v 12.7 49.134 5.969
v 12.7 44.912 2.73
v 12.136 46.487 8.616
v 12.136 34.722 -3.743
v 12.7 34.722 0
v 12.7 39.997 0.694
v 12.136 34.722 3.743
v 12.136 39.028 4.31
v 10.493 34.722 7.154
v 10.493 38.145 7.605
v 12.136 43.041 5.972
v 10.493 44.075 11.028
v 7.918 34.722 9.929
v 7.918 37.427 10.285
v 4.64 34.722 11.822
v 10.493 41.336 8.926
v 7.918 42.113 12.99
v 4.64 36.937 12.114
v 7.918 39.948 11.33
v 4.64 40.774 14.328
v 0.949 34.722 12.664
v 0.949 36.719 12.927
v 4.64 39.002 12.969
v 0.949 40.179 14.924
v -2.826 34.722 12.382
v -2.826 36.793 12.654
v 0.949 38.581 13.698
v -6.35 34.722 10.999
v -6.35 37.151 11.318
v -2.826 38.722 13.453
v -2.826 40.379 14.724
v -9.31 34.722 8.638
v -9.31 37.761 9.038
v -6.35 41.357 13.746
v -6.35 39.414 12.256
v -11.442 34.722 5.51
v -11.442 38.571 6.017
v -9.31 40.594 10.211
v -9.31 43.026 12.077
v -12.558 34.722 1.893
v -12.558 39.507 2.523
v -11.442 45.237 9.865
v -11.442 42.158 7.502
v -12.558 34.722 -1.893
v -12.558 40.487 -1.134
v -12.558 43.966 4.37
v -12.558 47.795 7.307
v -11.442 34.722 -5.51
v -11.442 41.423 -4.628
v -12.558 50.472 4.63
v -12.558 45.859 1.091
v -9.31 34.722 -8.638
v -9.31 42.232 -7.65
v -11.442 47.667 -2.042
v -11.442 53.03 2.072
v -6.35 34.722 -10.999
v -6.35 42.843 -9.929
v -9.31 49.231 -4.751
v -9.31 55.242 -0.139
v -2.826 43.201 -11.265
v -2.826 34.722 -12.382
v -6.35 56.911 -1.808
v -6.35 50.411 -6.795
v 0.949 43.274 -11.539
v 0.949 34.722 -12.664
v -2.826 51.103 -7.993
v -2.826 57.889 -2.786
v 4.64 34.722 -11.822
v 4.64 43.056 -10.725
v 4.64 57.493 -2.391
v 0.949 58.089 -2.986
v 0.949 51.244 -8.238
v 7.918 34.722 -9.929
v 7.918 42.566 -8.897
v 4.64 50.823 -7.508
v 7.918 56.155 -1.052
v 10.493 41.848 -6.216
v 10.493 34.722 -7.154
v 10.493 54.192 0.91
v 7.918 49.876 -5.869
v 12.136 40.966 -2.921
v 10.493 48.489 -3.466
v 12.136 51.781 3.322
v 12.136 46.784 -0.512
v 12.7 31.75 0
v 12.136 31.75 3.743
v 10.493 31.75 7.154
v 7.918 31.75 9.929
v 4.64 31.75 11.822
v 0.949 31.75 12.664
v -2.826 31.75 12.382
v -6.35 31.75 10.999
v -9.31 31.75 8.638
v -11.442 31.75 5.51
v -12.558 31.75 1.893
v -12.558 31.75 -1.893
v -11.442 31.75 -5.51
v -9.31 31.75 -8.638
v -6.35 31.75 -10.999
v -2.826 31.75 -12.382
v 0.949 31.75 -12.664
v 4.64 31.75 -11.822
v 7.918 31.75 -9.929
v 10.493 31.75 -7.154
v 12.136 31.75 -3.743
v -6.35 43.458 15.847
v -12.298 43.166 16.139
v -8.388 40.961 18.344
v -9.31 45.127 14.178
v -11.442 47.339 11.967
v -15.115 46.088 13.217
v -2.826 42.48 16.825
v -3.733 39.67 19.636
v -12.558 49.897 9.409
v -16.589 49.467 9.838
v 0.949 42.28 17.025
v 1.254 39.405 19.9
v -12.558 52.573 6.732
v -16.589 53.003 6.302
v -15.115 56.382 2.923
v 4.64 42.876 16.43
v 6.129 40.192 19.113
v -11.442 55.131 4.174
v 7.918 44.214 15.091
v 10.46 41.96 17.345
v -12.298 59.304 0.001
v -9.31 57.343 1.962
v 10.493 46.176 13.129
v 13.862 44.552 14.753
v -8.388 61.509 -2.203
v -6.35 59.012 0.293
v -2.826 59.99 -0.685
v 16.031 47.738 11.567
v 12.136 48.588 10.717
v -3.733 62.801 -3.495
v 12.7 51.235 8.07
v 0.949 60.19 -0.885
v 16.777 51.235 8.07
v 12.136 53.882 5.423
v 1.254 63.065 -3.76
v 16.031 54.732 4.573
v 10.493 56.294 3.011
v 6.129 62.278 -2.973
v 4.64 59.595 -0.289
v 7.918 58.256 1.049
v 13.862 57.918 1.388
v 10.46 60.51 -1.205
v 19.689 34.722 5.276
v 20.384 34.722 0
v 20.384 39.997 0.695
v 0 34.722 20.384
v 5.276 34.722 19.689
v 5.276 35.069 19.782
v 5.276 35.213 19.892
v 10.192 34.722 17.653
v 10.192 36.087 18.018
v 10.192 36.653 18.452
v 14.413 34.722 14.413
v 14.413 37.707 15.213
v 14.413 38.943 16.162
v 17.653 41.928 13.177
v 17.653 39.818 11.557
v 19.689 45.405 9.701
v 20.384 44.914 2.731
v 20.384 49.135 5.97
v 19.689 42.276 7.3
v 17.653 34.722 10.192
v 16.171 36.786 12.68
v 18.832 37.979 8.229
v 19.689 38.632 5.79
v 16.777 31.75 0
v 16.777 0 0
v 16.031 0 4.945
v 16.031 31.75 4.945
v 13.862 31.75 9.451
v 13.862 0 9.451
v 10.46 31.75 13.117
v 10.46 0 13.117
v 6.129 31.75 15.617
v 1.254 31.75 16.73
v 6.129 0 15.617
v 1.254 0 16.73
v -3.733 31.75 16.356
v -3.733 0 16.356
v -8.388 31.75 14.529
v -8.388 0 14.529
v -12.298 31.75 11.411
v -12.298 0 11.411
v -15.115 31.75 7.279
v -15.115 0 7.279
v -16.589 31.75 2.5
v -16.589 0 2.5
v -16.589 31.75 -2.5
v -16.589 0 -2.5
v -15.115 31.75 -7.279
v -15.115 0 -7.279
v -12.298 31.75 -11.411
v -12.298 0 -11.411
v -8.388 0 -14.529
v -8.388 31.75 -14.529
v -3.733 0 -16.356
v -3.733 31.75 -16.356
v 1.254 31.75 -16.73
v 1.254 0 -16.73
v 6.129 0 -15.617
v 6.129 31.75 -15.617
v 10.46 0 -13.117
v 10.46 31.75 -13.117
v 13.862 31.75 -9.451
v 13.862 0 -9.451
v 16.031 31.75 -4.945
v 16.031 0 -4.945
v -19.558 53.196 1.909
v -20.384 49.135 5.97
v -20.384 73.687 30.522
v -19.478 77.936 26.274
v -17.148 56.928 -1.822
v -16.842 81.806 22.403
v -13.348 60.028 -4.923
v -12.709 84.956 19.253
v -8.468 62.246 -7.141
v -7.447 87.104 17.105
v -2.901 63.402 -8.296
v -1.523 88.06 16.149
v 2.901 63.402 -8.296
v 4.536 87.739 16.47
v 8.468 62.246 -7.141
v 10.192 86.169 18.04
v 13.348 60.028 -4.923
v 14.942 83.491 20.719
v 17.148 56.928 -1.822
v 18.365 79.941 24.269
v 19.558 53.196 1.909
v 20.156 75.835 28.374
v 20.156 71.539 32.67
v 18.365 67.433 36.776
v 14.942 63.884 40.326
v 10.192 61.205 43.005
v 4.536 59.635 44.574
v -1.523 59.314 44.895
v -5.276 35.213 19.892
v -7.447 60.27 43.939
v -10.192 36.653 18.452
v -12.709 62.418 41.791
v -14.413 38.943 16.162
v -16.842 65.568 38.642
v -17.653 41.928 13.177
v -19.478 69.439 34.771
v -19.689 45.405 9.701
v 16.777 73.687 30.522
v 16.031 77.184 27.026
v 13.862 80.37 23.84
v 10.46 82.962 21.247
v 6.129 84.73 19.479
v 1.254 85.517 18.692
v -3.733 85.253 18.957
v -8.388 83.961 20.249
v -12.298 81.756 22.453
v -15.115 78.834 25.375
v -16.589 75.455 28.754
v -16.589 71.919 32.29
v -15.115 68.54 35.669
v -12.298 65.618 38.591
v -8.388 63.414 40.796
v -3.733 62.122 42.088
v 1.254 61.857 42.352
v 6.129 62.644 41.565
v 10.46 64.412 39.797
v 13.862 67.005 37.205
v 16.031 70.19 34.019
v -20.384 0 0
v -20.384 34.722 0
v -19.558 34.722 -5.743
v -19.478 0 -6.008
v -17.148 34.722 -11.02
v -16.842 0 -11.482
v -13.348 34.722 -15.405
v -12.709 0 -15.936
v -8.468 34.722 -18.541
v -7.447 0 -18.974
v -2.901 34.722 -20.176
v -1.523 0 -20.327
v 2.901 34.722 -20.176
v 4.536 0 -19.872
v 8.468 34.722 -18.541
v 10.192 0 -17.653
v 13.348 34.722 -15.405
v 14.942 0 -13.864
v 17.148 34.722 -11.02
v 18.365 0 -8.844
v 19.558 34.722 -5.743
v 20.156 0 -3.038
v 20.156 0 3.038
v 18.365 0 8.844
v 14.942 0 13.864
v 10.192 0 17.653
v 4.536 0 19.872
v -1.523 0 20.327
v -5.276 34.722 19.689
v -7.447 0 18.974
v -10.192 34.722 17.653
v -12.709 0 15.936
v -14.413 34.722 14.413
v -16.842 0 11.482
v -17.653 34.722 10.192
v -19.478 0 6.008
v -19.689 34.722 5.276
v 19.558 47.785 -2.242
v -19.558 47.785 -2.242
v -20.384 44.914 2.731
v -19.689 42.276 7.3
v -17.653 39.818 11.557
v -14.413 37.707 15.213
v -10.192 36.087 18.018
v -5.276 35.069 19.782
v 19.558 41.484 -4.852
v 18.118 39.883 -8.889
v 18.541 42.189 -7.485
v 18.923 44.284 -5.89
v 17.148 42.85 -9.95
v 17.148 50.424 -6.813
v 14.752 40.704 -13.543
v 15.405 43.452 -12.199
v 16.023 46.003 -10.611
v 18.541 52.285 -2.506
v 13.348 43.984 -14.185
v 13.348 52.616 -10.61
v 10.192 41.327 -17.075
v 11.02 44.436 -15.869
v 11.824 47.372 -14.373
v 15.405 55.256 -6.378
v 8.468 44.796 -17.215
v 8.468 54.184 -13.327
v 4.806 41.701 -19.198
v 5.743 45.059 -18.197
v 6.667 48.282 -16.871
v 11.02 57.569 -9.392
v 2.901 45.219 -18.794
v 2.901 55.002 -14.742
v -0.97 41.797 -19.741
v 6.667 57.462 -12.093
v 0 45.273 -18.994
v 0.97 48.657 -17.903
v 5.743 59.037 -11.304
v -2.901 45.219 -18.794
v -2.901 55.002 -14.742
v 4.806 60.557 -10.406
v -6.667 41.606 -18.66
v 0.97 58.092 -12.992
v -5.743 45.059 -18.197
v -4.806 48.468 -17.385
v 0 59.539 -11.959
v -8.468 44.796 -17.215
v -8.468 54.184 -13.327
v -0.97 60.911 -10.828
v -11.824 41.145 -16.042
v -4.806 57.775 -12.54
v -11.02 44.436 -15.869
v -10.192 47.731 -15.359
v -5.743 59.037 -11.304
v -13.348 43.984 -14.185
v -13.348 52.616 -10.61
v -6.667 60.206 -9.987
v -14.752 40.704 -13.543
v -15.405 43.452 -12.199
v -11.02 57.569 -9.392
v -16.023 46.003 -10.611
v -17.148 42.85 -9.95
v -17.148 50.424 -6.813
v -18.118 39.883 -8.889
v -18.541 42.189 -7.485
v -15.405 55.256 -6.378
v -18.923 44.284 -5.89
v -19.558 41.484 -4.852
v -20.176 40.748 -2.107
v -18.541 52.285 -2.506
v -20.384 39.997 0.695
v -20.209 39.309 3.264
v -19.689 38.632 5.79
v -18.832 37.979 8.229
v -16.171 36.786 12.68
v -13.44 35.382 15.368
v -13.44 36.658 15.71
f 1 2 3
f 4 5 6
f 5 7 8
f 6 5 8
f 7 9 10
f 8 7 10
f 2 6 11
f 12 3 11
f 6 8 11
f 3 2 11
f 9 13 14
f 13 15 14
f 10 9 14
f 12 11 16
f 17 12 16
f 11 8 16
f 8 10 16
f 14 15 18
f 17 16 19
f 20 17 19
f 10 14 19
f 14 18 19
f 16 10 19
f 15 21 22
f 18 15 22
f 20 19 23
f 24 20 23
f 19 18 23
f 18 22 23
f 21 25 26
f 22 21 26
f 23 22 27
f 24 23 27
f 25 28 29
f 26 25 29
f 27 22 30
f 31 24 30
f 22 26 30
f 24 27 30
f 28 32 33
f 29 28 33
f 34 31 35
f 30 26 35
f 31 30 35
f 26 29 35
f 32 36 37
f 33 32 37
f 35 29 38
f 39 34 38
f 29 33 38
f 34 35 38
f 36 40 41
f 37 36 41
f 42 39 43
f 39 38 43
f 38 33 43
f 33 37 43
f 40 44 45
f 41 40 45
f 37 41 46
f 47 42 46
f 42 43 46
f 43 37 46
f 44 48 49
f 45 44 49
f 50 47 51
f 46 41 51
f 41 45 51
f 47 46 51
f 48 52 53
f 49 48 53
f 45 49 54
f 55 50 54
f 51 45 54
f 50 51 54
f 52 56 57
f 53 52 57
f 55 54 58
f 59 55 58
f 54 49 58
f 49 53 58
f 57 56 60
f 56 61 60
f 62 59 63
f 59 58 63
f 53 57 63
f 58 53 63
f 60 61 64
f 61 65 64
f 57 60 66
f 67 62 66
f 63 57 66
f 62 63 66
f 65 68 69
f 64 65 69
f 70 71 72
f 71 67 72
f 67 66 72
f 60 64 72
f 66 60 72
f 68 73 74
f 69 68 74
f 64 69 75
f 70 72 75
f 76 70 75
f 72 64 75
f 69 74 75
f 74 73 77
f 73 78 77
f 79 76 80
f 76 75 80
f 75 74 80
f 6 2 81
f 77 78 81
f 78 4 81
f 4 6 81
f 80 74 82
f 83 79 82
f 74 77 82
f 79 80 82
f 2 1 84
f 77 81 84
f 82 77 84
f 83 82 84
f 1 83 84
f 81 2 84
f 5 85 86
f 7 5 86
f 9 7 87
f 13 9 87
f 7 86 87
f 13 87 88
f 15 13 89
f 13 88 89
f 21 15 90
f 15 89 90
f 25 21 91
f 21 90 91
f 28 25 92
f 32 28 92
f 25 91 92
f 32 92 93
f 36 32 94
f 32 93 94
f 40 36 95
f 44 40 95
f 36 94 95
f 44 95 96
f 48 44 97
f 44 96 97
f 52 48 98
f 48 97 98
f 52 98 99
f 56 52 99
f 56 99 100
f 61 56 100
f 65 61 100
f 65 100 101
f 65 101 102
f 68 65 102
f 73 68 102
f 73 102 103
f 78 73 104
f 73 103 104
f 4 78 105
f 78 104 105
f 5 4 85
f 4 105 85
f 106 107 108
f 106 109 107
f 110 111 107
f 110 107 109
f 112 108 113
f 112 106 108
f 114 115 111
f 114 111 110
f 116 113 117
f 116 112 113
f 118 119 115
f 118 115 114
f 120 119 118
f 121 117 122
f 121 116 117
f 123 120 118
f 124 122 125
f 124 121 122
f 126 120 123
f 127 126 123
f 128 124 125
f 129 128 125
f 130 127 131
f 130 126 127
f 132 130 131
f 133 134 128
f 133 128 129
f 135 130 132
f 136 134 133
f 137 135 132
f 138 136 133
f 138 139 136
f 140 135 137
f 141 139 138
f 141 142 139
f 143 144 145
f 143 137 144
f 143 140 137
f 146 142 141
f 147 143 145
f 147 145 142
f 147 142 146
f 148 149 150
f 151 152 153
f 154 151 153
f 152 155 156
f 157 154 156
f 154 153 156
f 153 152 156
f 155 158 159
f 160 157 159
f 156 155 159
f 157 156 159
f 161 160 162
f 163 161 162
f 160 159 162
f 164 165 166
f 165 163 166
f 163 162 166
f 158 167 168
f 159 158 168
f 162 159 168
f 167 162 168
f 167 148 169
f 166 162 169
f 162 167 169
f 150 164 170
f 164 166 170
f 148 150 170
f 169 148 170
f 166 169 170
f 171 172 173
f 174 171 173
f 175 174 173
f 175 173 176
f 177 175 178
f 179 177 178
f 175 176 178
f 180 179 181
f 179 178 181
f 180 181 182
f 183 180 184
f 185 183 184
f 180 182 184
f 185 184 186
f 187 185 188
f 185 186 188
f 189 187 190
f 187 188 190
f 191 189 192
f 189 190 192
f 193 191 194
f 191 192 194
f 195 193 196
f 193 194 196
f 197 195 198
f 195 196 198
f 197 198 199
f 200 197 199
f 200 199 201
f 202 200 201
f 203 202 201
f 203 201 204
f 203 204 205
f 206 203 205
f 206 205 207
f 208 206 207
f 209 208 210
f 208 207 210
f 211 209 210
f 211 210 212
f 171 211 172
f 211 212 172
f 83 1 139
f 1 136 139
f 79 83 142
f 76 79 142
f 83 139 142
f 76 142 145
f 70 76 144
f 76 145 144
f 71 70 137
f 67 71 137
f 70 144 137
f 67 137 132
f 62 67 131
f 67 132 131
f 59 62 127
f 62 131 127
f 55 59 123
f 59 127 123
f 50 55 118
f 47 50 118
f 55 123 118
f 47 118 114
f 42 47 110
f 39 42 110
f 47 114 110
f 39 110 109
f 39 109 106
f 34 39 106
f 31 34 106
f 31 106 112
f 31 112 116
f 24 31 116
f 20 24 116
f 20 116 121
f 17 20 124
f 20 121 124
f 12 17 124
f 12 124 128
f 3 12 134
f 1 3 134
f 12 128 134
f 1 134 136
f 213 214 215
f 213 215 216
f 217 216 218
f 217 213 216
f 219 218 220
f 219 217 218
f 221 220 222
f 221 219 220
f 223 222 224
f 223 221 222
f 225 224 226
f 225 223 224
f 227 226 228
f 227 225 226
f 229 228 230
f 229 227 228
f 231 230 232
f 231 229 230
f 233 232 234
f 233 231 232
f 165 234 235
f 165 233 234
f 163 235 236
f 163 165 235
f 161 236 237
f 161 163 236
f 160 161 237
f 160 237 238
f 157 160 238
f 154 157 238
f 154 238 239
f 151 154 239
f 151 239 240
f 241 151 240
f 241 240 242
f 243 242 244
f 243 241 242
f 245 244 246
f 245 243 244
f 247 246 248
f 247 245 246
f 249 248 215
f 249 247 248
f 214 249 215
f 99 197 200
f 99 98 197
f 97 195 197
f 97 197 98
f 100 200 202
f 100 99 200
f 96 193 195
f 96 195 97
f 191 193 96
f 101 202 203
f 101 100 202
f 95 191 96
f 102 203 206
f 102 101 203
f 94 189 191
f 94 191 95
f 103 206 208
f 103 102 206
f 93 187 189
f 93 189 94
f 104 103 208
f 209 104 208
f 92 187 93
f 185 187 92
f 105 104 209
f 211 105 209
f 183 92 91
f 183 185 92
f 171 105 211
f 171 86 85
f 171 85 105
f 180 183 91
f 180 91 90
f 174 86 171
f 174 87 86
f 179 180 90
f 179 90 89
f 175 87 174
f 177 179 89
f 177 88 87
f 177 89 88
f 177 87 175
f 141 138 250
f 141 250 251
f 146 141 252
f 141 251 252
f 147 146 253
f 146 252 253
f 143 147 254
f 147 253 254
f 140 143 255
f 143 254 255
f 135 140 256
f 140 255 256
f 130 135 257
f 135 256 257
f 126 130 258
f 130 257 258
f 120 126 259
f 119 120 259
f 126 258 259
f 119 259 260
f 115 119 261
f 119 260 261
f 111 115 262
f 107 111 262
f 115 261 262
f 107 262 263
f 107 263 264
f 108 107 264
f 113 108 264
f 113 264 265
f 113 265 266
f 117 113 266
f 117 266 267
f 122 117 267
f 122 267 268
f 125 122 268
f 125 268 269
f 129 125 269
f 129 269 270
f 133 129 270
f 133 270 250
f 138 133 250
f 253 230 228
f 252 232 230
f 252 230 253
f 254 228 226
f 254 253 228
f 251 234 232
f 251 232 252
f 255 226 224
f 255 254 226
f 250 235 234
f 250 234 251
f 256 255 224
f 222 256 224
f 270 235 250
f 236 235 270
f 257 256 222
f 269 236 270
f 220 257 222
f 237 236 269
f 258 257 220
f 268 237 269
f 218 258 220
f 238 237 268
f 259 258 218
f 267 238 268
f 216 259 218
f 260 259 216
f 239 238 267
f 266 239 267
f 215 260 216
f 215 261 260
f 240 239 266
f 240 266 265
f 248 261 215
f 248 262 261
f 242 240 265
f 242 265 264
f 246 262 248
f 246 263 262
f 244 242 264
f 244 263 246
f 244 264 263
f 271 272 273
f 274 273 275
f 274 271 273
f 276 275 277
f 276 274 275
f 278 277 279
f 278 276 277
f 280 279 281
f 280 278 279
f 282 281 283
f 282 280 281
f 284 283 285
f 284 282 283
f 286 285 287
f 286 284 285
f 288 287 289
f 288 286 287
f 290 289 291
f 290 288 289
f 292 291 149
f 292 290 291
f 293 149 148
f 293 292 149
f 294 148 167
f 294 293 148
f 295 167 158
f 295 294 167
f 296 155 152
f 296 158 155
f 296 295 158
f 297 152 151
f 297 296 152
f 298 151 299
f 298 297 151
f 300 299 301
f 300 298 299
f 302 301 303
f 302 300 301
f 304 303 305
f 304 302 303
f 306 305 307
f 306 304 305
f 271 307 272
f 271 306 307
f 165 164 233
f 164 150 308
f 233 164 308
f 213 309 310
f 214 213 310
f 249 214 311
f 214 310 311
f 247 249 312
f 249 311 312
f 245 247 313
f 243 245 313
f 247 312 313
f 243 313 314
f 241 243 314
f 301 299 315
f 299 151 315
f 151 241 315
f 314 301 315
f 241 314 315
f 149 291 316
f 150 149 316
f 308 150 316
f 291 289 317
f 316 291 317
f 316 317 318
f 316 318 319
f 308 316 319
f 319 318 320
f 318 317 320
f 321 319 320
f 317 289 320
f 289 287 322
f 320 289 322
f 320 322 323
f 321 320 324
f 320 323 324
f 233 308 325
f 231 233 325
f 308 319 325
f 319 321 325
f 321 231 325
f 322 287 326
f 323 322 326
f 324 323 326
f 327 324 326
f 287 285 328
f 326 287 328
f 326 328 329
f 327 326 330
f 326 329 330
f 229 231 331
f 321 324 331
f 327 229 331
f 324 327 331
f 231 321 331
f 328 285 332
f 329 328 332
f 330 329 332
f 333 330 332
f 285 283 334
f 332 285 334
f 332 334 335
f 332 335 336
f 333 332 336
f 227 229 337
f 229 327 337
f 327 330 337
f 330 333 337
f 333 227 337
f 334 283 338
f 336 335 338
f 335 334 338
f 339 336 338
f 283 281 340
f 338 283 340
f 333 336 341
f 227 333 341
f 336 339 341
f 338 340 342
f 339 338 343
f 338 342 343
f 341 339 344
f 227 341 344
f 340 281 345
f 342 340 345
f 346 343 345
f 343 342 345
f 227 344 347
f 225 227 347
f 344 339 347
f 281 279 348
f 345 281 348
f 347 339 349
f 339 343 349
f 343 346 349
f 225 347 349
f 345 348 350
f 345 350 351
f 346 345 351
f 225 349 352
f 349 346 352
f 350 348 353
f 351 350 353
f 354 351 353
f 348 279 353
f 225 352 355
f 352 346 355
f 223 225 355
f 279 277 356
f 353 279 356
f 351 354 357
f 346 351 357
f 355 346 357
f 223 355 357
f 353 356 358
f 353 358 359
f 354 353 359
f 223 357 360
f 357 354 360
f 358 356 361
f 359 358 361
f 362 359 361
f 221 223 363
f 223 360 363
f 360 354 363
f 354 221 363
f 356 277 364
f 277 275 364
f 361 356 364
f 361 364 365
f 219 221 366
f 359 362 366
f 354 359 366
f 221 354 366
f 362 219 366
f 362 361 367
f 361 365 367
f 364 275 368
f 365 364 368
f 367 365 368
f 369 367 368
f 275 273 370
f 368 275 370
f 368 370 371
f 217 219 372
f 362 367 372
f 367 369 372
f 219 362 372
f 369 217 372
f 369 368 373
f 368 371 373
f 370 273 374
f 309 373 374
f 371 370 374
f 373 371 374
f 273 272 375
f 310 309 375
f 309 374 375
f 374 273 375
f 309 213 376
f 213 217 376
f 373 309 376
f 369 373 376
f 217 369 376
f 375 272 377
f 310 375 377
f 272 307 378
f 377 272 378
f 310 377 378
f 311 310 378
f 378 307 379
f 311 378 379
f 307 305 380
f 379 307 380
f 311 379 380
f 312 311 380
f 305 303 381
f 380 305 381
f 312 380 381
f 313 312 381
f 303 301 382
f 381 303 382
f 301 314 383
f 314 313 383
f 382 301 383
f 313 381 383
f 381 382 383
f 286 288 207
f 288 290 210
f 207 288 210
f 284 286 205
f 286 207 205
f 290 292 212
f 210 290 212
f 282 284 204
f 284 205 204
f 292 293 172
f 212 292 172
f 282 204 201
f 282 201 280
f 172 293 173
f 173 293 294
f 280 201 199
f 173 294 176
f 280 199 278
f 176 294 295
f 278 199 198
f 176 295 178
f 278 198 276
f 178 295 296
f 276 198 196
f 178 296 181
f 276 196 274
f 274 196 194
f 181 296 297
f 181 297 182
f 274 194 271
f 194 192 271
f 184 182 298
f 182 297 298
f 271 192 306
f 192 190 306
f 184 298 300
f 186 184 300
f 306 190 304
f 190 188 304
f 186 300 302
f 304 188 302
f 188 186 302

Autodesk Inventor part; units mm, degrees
sketch "Sketch1" plane through (0, 0, 0) normal (0, 1, 0) x (-1, 0, 0)
  circle A0 centre (0, 0) radius 20.3835
  dimension "d0" = 40.767
extrude "Extrusion1" add sketch "Sketch1" along normal blind 34.7218
sketch "Sketch2" plane through (0, 34.7218, 0) normal (0, 1, 0) x (1, 0, 0)
  circle A0 centre (0, 0) radius 20.3835 projected
  line L0 (0, -20.3835) -> (-27.7458, -20.3835)
ref_plane "Work Plane1" through (0, 34.7218, 20.3835) normal (0, 0.7071068, 0.7071068) x (-1, 0, 0)
sketch "Sketch3" plane through (0, 34.7218, 20.3835) normal (0, 0.7071068, 0.7071068) x (-1, 0, 0)
  circle A0 centre (0, -20.3835) radius 20.3835 projected
  circle A1 centre (0, -20.3835) radius 20.3835
  point P0 (0, 10.1387)
extrude "Extrusion2" add sketch "Sketch3" along normal blind 34.7218
sketch "Sketch4" plane through (0, 0, 0) normal (0, -1, 0) x (1, 0, 0)
  circle A0 centre (0, 0) radius 16.7767
  dimension "d6" = 33.5534
extrude "Extrusion3" cut sketch "Sketch4" against normal blind 31.75
sketch "Sketch5" plane through (0, 73.6871, 30.5222) normal (0, 0.7071068, 0.7071068) x (1, 0, 0)
  circle A0 centre (0, 0) radius 16.7767
  point P0 (0, -30.5222)
  dimension "d9" = 33.5534
extrude "Extrusion4" cut sketch "Sketch5" against normal blind 31.75
ref_plane "Work Plane2" through (0, 51.2365, 8.0716) normal (0, 0.7071068, 0.7071068) x (1, 0, 0)
ref_plane "Work Plane3" through (0, 31.75, 0) normal (0, -1, 0) x (1, 0, 0)
revolve "Revolution1" add sketch "Sketch2" angle 45 about axis through (0, 34.7218, 20.3835) along (1, 0, 0)
ref_plane "Work Plane4" through (0, 34.7218, 20.3835) normal (-1, 0, 0) x (0, -1, 0)
sketch "Sketch6" plane through (0, 34.7218, 20.3835) normal (-1, 0, 0) x (0, -1, 0)
  line L0 (0, 33.7996) -> (-51.2396, 33.7996)
  point P0 (34.7218, -20.3835)
ref_plane "Work Plane5" through (0, 34.7218, 54.1831) normal (-0.7071068, 0, -0.7071068) x (0, 1, 0)
sketch "Sketch8" plane through (0, 34.7218, 20.3835) normal (-1, 0, 0) x (0, -1, 0)
  line L0 (-28.3776, -24.1748) -> (-4.6518, -0.449) projected
  line L1 (2.9718, -3.6068) -> (2.9718, -37.1602) projected
  line L2 (-4.6518, -0.449) -> (2.9718, -3.6068)
  point P0 (34.7218, -20.3835)
sketch "Sketch9" plane through (0, 31.75, 0) normal (0, -1, 0) x (1, 0, 0)
  circle A0 centre (0, 0) radius 12.7
  dimension "d17" = 25.4
extrude "Extrusion5" cut sketch "Sketch9" against normal blind 2.9718
sketch "Sketch10" plane through (0, 51.2365, 8.0716) normal (0, 0.7071068, 0.7071068) x (1, 0, 0)
  circle A0 centre (0, 0) radius 12.7
  point P0 (0, -30.5222)
  dimension "d20" = 25.4
extrude "Extrusion6" cut sketch "Sketch10" against normal blind 2.9718
sketch "Sketch11" plane through (0, 34.7218, 0) normal (0, -1, 0) x (1, 0, 0)
  circle A0 centre (0, 0) radius 12.7
  line L0 (28.5369, 20.3835) -> (-28.5369, 20.3835) projected
revolve "Revolution2" cut sketch "Sketch11" angle 45 about axis through (0, 34.7218, 20.3835) along (1, 0, 0)
properties part number "45 Elbow 1 Inch"
